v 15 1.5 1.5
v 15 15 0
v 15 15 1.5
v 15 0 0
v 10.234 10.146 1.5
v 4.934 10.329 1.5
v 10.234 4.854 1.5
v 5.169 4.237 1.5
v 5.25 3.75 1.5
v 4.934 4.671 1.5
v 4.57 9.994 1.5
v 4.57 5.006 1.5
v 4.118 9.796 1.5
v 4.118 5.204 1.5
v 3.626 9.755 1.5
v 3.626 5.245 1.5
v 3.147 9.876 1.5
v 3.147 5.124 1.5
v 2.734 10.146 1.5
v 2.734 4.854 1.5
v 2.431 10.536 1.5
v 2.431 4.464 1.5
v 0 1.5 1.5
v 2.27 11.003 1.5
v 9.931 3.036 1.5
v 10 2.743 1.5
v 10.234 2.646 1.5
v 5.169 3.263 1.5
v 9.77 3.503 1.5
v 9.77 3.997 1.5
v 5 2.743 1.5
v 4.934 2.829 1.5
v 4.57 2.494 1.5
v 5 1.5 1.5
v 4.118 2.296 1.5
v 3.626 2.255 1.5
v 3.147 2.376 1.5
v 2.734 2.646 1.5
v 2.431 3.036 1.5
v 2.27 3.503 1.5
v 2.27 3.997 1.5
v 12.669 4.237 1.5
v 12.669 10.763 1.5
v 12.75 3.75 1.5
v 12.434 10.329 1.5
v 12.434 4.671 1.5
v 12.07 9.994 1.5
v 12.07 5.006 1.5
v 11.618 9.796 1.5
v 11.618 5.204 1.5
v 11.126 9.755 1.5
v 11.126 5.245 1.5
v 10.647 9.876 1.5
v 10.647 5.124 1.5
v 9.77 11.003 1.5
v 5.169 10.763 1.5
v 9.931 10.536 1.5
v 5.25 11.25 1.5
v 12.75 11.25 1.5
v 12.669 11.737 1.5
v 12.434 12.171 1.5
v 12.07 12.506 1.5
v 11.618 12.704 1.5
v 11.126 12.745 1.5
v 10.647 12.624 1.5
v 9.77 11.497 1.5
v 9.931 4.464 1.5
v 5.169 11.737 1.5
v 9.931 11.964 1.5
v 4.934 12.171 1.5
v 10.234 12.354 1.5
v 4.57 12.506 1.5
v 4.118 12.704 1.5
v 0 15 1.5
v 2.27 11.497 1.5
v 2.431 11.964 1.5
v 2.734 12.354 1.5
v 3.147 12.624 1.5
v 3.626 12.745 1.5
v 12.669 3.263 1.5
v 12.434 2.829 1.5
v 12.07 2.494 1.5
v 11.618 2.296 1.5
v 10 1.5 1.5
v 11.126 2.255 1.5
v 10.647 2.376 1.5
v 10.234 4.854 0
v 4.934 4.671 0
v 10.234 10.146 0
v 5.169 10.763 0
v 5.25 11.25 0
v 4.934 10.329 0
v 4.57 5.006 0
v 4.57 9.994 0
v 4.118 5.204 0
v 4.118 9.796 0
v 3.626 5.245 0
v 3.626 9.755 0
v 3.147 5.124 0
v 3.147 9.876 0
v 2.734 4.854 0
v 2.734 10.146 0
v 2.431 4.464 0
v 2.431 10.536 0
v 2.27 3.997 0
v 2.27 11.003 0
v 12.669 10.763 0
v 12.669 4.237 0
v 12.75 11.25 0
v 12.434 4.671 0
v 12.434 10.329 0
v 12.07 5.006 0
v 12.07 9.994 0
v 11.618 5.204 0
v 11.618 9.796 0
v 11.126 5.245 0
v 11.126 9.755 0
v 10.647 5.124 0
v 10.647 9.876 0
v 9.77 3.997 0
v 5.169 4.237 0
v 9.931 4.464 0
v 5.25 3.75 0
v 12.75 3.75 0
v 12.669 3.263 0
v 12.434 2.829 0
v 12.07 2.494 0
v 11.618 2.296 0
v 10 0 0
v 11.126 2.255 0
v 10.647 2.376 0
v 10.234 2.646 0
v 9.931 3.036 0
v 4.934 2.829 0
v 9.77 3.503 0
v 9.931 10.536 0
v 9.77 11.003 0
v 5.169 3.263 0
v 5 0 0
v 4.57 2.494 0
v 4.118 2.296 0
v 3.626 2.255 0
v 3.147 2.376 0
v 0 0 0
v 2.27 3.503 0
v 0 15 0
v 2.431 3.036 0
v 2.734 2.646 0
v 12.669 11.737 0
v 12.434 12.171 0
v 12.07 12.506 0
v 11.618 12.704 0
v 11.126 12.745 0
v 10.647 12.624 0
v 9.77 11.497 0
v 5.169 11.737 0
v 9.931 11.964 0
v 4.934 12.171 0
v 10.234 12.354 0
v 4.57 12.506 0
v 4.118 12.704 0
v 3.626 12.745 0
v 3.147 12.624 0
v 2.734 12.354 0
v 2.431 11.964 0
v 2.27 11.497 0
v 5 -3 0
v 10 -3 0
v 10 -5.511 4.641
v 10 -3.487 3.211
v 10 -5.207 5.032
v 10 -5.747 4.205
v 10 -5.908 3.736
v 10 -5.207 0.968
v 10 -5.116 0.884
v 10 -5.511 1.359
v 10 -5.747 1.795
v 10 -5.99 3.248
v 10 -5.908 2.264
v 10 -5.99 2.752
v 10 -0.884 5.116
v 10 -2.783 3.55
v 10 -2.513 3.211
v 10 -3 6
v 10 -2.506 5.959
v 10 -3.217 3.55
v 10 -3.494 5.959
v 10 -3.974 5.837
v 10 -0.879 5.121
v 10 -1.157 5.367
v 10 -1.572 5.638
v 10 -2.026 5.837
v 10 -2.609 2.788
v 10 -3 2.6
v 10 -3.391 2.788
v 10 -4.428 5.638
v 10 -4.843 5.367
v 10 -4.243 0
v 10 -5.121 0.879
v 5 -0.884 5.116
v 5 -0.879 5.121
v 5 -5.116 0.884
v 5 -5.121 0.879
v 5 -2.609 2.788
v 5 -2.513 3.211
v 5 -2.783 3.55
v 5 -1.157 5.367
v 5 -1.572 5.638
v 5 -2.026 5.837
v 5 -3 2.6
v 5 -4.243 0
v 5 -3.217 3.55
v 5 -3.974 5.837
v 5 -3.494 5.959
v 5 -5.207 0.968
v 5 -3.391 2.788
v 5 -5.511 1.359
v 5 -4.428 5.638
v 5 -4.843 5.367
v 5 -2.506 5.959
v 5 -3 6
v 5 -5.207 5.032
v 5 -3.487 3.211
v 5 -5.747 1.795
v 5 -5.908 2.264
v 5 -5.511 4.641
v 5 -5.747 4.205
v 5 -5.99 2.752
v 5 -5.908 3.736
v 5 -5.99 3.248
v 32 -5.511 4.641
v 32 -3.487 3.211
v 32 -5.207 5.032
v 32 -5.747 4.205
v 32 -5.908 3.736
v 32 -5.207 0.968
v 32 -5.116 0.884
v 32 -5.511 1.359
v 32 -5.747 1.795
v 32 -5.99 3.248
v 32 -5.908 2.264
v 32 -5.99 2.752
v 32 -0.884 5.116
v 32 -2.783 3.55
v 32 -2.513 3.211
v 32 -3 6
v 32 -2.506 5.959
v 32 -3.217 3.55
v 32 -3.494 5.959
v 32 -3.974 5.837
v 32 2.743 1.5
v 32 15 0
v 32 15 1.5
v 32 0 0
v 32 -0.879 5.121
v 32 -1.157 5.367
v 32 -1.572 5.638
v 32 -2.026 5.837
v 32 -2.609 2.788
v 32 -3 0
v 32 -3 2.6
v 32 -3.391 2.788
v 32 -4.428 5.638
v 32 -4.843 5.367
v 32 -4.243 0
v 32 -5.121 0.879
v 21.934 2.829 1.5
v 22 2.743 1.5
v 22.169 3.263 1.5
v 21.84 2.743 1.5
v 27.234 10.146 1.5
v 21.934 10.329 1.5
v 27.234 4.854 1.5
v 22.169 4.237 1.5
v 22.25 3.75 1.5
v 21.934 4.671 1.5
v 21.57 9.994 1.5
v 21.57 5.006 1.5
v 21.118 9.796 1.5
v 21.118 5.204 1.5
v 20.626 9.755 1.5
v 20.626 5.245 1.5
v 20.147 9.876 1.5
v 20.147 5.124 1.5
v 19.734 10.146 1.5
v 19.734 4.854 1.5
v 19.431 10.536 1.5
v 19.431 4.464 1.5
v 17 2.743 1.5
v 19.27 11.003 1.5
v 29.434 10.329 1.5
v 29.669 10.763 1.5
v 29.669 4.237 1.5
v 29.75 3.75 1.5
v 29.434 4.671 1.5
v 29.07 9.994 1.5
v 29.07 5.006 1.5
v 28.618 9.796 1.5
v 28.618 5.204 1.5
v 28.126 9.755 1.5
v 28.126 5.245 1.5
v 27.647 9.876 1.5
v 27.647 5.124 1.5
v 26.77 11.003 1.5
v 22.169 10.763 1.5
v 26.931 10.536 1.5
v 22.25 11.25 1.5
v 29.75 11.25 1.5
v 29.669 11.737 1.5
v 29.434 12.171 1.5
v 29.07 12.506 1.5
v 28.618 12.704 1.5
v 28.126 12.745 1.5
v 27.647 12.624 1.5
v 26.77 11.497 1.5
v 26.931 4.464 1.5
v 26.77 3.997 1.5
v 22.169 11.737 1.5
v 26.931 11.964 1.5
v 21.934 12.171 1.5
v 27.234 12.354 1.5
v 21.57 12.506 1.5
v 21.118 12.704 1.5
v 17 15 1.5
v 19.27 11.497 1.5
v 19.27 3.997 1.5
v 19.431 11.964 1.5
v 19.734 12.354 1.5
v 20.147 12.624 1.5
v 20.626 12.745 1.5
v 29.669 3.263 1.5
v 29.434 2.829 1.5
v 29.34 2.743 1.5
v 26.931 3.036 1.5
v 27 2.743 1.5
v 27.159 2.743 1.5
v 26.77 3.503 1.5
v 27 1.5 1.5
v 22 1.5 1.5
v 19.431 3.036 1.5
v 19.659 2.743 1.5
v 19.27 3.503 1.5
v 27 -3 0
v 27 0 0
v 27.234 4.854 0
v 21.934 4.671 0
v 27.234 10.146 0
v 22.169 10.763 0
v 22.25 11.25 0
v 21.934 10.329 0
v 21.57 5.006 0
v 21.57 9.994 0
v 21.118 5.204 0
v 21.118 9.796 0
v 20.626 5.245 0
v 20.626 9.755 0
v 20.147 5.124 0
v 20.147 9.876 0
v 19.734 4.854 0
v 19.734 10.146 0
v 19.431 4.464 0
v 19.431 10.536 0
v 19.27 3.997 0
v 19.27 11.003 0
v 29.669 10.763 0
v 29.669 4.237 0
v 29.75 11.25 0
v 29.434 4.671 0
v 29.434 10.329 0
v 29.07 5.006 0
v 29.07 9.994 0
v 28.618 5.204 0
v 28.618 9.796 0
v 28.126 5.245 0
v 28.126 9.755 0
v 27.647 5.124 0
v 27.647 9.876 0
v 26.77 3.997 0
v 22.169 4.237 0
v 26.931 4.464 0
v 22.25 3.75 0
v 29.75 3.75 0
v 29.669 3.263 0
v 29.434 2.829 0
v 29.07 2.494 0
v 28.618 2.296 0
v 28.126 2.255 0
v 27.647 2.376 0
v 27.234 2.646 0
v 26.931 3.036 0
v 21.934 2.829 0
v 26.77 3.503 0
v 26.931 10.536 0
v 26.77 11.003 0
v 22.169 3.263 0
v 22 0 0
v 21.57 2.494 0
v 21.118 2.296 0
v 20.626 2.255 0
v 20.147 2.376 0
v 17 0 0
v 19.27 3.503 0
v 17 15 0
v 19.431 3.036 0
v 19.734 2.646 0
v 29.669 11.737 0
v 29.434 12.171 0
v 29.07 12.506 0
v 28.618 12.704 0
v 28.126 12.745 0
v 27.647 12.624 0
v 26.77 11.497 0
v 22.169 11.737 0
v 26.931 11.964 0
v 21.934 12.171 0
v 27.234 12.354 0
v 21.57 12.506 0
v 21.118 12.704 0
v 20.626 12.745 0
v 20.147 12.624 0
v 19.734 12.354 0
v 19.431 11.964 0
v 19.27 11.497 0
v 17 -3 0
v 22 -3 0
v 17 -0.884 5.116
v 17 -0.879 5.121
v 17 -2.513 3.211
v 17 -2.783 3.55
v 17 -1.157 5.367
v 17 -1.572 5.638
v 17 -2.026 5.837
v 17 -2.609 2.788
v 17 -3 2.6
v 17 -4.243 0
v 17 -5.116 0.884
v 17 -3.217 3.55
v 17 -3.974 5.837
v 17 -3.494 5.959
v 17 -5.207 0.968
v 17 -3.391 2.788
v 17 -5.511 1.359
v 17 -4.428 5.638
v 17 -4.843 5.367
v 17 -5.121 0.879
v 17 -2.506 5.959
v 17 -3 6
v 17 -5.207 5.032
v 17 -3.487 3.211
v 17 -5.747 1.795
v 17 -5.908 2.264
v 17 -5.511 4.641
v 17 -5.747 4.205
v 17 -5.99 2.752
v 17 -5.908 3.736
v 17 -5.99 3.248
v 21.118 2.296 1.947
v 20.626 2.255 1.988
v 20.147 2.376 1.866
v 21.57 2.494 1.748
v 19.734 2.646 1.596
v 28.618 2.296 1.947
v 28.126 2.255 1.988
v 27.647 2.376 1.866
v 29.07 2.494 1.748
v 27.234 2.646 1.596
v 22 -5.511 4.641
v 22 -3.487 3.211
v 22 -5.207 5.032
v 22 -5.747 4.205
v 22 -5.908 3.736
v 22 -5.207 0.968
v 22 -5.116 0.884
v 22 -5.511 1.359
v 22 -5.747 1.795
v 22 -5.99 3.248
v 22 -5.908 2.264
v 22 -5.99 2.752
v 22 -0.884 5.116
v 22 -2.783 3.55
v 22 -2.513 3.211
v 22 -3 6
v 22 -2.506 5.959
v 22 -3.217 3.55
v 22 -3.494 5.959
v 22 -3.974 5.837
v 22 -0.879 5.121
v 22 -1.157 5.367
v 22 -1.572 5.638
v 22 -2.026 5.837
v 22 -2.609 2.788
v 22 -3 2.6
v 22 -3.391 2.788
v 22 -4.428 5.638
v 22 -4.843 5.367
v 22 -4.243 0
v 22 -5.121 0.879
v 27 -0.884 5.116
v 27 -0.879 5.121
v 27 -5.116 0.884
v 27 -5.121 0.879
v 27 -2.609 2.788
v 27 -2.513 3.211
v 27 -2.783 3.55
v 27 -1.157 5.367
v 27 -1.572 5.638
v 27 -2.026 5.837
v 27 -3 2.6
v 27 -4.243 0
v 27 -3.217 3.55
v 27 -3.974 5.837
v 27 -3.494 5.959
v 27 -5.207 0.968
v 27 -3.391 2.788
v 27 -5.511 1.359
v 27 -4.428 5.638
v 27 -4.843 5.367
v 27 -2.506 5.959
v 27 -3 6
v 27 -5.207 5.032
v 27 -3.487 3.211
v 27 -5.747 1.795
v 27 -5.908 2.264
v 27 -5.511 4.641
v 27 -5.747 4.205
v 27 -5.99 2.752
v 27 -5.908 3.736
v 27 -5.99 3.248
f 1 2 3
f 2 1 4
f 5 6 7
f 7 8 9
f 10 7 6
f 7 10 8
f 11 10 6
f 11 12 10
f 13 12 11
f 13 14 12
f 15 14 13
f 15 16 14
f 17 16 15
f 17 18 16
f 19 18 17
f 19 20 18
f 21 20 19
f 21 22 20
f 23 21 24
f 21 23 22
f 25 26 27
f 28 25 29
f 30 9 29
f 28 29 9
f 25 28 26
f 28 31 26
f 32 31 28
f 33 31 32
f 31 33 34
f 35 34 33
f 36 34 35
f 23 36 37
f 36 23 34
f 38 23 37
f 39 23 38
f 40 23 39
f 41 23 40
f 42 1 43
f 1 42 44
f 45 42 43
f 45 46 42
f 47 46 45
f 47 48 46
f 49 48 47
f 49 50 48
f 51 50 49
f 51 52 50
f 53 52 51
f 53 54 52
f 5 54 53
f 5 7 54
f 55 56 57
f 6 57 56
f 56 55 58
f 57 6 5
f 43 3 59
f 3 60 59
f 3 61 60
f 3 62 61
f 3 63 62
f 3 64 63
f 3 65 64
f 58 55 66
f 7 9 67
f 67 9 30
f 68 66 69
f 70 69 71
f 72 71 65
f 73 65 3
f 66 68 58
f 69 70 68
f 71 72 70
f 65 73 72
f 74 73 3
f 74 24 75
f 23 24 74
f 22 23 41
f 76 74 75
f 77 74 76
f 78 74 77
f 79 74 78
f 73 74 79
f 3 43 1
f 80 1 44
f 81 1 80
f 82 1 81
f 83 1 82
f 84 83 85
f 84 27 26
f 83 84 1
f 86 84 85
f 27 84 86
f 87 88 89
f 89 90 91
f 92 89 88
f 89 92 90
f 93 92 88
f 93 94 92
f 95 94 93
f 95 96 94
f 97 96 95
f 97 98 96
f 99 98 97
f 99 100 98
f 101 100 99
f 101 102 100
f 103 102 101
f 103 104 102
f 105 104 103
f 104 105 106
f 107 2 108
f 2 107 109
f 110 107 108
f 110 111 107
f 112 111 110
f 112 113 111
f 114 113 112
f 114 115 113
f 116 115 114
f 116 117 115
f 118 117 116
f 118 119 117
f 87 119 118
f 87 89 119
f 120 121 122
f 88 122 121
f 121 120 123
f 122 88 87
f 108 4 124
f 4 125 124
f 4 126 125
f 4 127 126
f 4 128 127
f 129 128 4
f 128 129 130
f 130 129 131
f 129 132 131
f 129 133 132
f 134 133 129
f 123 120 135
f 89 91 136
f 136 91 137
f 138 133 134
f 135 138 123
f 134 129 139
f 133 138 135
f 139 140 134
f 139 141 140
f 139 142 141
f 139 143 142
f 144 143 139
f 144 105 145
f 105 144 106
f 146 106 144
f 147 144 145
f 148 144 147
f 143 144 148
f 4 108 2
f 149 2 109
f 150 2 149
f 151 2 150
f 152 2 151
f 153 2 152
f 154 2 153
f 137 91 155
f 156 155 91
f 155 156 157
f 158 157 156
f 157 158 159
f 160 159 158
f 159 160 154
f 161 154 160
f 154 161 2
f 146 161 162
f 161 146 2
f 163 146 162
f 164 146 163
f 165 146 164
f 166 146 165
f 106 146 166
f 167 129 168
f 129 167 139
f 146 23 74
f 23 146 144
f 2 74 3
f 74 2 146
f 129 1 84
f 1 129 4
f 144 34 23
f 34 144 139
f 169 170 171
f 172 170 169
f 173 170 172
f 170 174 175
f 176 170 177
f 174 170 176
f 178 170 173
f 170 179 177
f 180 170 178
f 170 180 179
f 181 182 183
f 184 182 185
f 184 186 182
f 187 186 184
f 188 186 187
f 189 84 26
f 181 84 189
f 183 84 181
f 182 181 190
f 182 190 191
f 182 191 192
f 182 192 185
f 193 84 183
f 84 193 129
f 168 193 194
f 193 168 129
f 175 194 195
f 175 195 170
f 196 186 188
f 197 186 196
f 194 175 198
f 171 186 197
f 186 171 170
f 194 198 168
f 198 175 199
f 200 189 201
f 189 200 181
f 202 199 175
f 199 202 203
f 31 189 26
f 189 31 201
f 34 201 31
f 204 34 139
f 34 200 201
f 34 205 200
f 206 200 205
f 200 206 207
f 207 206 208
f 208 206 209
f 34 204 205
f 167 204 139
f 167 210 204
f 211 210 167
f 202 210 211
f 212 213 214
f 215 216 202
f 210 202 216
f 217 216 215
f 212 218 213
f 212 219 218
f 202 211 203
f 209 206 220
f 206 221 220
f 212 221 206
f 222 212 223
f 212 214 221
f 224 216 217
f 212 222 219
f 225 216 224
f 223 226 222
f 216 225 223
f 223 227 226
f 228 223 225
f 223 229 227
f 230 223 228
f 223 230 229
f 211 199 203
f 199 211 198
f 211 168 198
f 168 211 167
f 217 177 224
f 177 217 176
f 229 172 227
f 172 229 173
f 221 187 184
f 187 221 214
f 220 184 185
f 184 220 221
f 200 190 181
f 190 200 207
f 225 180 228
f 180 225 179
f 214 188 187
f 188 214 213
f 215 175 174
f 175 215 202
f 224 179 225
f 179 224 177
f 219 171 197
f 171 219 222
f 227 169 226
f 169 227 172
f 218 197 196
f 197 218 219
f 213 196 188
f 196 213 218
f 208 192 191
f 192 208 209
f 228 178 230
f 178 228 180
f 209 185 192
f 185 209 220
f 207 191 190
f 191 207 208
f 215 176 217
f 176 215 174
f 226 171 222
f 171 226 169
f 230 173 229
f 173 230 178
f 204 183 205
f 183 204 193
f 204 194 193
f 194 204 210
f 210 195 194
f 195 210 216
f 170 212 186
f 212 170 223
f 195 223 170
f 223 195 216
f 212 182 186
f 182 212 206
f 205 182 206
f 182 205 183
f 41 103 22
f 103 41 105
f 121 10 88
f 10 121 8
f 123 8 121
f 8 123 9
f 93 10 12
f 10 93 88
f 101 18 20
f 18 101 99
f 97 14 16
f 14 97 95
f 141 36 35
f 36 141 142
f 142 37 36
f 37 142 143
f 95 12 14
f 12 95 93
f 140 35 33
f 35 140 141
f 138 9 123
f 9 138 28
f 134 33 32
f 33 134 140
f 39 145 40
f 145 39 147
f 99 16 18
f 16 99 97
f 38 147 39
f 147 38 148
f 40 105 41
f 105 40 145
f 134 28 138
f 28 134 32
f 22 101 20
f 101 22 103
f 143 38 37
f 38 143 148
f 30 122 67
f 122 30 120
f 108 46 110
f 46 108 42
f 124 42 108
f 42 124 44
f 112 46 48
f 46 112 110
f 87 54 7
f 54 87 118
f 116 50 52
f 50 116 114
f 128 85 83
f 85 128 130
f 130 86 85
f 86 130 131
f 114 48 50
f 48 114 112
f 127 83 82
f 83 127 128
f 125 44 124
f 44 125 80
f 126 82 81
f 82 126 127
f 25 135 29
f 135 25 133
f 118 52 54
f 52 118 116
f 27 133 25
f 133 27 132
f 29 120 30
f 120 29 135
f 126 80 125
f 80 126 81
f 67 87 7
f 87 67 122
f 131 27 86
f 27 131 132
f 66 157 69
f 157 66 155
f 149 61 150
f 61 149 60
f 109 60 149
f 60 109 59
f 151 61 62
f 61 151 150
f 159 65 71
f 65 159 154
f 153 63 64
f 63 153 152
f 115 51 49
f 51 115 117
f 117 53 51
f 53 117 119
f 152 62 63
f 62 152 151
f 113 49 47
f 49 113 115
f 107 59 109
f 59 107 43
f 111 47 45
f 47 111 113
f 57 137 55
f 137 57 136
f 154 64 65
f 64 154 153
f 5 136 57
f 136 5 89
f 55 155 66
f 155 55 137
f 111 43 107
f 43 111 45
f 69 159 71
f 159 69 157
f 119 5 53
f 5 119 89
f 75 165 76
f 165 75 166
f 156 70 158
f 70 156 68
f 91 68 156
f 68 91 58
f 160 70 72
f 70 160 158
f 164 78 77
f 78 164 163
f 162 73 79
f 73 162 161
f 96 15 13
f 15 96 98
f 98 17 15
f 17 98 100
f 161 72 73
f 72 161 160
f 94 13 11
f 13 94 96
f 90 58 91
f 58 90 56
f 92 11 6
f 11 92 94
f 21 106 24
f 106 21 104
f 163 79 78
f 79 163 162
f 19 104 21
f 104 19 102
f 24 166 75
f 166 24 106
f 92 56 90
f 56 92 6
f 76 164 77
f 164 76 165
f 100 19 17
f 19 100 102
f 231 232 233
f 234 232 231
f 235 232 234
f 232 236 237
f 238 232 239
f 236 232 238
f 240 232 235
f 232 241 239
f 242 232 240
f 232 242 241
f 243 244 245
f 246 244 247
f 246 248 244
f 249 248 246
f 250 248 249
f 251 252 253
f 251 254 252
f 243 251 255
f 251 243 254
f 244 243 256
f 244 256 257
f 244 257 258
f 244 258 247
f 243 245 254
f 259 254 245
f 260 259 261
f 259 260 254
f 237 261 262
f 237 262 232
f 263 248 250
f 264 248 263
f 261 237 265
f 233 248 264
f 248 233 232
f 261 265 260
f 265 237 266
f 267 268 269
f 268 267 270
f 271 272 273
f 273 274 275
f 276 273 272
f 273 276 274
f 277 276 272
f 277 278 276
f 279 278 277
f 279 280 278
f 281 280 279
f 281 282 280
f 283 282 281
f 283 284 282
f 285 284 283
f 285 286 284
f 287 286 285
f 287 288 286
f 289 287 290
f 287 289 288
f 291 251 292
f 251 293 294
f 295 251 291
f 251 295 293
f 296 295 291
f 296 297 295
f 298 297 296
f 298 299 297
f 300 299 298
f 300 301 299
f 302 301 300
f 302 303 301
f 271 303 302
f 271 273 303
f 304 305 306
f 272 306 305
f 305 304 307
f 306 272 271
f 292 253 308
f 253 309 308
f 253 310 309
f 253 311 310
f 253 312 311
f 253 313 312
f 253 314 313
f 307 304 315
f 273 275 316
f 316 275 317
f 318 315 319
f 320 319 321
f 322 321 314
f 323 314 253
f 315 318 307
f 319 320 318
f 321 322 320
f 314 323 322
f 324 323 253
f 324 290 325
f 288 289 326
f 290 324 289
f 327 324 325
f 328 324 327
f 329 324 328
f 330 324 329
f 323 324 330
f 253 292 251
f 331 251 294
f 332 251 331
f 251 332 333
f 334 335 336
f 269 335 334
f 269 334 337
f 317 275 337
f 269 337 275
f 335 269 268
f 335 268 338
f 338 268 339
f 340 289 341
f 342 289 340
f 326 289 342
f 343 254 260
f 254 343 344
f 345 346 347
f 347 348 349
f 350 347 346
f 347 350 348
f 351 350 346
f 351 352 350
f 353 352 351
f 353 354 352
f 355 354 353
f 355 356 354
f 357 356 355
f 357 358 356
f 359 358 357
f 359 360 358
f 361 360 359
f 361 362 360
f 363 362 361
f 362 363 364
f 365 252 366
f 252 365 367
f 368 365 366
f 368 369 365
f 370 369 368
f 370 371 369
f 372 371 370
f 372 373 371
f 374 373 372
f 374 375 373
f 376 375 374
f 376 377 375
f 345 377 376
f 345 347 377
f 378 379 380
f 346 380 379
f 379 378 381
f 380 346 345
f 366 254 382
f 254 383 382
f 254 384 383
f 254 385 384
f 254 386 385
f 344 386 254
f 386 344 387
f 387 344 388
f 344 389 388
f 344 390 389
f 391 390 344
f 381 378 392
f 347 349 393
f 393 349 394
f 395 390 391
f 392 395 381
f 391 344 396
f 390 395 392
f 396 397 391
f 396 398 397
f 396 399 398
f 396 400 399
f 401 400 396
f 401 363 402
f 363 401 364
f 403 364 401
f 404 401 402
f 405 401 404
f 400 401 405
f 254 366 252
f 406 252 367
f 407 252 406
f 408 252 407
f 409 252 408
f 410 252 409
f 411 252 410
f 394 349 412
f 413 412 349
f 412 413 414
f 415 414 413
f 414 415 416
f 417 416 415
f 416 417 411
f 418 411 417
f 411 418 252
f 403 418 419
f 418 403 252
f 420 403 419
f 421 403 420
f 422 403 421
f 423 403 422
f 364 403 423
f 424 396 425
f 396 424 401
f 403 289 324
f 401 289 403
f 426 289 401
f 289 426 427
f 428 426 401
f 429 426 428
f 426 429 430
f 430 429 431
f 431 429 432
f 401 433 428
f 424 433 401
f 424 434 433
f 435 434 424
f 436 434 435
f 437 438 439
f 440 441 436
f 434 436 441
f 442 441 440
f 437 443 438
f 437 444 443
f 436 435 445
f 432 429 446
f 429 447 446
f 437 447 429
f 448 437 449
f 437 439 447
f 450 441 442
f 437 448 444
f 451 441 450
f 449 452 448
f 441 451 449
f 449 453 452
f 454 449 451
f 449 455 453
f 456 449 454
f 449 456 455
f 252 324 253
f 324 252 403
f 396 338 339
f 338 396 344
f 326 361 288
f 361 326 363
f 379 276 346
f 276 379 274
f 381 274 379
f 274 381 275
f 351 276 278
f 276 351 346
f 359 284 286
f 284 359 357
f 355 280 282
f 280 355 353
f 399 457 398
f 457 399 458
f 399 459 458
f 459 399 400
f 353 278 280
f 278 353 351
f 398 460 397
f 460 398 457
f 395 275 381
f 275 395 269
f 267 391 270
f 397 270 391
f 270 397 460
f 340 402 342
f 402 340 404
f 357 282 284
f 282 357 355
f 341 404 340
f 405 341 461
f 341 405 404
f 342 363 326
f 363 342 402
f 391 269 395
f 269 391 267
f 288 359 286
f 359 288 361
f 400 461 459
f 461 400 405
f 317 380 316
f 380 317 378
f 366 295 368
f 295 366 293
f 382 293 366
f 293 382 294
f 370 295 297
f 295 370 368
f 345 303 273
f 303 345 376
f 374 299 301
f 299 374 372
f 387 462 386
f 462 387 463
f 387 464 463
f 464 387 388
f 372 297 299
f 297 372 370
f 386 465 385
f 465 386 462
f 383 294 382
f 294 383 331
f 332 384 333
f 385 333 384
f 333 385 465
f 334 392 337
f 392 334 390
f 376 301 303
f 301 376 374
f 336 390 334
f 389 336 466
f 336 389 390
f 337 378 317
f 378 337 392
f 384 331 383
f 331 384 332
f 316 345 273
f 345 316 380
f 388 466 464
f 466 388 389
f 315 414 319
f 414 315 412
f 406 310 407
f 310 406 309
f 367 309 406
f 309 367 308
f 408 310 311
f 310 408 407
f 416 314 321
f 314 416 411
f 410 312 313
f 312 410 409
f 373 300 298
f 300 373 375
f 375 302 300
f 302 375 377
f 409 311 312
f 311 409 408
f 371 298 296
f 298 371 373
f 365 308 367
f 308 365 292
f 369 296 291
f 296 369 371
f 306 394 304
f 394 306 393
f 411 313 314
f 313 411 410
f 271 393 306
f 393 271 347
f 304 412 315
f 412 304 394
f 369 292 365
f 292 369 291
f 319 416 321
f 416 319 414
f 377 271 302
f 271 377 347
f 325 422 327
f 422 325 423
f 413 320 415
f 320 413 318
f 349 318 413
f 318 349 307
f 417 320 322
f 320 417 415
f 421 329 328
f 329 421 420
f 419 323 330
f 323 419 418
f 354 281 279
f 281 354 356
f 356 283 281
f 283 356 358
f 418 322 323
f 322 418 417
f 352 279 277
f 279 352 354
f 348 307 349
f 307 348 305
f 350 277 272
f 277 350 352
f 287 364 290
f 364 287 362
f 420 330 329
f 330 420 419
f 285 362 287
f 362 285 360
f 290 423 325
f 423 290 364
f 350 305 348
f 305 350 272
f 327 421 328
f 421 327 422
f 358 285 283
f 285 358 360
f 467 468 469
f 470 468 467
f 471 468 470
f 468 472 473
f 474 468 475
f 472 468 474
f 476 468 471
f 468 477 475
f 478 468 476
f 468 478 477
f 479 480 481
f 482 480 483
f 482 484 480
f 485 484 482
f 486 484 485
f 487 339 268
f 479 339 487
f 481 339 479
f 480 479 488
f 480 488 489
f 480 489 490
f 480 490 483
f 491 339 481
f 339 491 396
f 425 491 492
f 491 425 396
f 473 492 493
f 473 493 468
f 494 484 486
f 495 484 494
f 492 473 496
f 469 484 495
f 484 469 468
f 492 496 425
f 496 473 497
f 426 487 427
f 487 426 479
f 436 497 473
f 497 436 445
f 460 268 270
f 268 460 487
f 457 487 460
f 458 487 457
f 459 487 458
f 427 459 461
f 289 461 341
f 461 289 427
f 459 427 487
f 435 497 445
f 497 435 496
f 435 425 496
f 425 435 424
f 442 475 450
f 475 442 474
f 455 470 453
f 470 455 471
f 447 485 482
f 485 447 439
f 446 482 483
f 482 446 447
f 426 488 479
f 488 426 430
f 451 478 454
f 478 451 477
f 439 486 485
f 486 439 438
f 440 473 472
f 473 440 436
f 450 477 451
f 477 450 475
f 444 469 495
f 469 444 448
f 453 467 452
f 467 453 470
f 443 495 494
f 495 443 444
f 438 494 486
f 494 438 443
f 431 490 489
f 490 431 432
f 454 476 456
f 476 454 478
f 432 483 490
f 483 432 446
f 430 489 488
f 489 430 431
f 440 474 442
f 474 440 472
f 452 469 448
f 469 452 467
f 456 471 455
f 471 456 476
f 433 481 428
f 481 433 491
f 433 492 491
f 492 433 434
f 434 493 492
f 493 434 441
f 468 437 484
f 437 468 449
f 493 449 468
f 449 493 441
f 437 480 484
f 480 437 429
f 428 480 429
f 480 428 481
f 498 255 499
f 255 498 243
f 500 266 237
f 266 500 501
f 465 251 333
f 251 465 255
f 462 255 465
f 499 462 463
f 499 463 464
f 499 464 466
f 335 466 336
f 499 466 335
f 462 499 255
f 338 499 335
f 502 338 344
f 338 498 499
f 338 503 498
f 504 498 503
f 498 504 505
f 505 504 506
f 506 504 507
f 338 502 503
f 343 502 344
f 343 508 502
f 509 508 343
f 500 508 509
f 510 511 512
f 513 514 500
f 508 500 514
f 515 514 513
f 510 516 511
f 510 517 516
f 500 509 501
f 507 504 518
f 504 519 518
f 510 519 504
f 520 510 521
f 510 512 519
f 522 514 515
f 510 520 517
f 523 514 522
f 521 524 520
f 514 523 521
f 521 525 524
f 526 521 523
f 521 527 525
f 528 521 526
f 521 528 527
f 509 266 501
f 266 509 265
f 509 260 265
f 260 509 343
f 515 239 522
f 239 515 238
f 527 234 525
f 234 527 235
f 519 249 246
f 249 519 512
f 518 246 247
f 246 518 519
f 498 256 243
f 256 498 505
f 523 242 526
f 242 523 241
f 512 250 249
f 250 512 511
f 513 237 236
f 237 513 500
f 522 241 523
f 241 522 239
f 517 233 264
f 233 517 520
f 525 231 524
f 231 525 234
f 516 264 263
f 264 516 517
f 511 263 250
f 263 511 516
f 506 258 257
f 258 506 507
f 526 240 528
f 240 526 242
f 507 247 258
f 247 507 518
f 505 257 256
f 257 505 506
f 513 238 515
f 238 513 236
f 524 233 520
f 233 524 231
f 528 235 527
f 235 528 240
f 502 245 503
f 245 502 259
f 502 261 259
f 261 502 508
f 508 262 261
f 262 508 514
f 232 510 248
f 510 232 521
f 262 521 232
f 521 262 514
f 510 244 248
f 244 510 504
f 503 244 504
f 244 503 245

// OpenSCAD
plate_width=15;
plate_length=15;
plate_thickness=1.5;
pin_diameter=1;
pin_surround=2.5;
glue_hole_diameter=3;
hinge_radius=(pin_diameter+(pin_surround*2))/2;
hinge_thickness=plate_width/3;

$fa=.5;
$fs=.5;

module base(){
	cube([plate_width,plate_length,plate_thickness]);}
module glue_holes(){
	translate([plate_width/4,plate_length/4,-0.1]){
		#cylinder(r=glue_hole_diameter/2,h=plate_thickness+2);
	}
	translate([plate_width/4*3,plate_length/4,-0.1]){
		#cylinder(r=glue_hole_diameter/2,h=plate_thickness+2);
	}
	translate([plate_width/4*3,plate_length/4*3,-0.1]){
		#cylinder(r=glue_hole_diameter/2,h=plate_thickness+2);
	}
	translate([plate_width/4,plate_length/4*3,-0.1]){
		#cylinder(r=glue_hole_diameter/2,h=plate_thickness+2);
	}
}
module hinge(){
	translate([hinge_thickness,-hinge_radius,hinge_radius]){
		rotate([0,90,0]){
			difference(){
				union(){
					cylinder(r=hinge_radius,h=hinge_thickness);
					difference(){
						rotate([0,0,45]){
							translate([0,-hinge_radius,0]){
							cube([hinge_radius*4.5,hinge_radius*2,hinge_thickness]);
							}
						}
						translate([hinge_radius,-hinge_radius,-hinge_thickness]){
							#cube([30,30,30]);
						}
					}
				}
				translate([-.1,0,0]){
					#cylinder(r=pin_diameter/2,h=hinge_thickness+.2);
				}
			}
		}
	}
}

difference(){
	union(){
		difference(){
			cube([plate_width,plate_length,plate_thickness]);
			rotate([45,0,0]){
				cube(plate_width,30,-30);
			}
		}	
		hinge();
	}
	glue_holes();
}

translate([plate_width+2,0,0]){
	difference(){
		union(){
			difference(){
			cube([plate_width,plate_length,plate_thickness]);
			rotate([45,0,0]){
				cube(plate_width,30,-30);
			}
		}
			translate([-plate_width/3,0,0]){
				hinge();
			}
			translate([plate_width/3,0,0]){
				hinge();
			}
		}
		glue_holes();
	}
	
}
